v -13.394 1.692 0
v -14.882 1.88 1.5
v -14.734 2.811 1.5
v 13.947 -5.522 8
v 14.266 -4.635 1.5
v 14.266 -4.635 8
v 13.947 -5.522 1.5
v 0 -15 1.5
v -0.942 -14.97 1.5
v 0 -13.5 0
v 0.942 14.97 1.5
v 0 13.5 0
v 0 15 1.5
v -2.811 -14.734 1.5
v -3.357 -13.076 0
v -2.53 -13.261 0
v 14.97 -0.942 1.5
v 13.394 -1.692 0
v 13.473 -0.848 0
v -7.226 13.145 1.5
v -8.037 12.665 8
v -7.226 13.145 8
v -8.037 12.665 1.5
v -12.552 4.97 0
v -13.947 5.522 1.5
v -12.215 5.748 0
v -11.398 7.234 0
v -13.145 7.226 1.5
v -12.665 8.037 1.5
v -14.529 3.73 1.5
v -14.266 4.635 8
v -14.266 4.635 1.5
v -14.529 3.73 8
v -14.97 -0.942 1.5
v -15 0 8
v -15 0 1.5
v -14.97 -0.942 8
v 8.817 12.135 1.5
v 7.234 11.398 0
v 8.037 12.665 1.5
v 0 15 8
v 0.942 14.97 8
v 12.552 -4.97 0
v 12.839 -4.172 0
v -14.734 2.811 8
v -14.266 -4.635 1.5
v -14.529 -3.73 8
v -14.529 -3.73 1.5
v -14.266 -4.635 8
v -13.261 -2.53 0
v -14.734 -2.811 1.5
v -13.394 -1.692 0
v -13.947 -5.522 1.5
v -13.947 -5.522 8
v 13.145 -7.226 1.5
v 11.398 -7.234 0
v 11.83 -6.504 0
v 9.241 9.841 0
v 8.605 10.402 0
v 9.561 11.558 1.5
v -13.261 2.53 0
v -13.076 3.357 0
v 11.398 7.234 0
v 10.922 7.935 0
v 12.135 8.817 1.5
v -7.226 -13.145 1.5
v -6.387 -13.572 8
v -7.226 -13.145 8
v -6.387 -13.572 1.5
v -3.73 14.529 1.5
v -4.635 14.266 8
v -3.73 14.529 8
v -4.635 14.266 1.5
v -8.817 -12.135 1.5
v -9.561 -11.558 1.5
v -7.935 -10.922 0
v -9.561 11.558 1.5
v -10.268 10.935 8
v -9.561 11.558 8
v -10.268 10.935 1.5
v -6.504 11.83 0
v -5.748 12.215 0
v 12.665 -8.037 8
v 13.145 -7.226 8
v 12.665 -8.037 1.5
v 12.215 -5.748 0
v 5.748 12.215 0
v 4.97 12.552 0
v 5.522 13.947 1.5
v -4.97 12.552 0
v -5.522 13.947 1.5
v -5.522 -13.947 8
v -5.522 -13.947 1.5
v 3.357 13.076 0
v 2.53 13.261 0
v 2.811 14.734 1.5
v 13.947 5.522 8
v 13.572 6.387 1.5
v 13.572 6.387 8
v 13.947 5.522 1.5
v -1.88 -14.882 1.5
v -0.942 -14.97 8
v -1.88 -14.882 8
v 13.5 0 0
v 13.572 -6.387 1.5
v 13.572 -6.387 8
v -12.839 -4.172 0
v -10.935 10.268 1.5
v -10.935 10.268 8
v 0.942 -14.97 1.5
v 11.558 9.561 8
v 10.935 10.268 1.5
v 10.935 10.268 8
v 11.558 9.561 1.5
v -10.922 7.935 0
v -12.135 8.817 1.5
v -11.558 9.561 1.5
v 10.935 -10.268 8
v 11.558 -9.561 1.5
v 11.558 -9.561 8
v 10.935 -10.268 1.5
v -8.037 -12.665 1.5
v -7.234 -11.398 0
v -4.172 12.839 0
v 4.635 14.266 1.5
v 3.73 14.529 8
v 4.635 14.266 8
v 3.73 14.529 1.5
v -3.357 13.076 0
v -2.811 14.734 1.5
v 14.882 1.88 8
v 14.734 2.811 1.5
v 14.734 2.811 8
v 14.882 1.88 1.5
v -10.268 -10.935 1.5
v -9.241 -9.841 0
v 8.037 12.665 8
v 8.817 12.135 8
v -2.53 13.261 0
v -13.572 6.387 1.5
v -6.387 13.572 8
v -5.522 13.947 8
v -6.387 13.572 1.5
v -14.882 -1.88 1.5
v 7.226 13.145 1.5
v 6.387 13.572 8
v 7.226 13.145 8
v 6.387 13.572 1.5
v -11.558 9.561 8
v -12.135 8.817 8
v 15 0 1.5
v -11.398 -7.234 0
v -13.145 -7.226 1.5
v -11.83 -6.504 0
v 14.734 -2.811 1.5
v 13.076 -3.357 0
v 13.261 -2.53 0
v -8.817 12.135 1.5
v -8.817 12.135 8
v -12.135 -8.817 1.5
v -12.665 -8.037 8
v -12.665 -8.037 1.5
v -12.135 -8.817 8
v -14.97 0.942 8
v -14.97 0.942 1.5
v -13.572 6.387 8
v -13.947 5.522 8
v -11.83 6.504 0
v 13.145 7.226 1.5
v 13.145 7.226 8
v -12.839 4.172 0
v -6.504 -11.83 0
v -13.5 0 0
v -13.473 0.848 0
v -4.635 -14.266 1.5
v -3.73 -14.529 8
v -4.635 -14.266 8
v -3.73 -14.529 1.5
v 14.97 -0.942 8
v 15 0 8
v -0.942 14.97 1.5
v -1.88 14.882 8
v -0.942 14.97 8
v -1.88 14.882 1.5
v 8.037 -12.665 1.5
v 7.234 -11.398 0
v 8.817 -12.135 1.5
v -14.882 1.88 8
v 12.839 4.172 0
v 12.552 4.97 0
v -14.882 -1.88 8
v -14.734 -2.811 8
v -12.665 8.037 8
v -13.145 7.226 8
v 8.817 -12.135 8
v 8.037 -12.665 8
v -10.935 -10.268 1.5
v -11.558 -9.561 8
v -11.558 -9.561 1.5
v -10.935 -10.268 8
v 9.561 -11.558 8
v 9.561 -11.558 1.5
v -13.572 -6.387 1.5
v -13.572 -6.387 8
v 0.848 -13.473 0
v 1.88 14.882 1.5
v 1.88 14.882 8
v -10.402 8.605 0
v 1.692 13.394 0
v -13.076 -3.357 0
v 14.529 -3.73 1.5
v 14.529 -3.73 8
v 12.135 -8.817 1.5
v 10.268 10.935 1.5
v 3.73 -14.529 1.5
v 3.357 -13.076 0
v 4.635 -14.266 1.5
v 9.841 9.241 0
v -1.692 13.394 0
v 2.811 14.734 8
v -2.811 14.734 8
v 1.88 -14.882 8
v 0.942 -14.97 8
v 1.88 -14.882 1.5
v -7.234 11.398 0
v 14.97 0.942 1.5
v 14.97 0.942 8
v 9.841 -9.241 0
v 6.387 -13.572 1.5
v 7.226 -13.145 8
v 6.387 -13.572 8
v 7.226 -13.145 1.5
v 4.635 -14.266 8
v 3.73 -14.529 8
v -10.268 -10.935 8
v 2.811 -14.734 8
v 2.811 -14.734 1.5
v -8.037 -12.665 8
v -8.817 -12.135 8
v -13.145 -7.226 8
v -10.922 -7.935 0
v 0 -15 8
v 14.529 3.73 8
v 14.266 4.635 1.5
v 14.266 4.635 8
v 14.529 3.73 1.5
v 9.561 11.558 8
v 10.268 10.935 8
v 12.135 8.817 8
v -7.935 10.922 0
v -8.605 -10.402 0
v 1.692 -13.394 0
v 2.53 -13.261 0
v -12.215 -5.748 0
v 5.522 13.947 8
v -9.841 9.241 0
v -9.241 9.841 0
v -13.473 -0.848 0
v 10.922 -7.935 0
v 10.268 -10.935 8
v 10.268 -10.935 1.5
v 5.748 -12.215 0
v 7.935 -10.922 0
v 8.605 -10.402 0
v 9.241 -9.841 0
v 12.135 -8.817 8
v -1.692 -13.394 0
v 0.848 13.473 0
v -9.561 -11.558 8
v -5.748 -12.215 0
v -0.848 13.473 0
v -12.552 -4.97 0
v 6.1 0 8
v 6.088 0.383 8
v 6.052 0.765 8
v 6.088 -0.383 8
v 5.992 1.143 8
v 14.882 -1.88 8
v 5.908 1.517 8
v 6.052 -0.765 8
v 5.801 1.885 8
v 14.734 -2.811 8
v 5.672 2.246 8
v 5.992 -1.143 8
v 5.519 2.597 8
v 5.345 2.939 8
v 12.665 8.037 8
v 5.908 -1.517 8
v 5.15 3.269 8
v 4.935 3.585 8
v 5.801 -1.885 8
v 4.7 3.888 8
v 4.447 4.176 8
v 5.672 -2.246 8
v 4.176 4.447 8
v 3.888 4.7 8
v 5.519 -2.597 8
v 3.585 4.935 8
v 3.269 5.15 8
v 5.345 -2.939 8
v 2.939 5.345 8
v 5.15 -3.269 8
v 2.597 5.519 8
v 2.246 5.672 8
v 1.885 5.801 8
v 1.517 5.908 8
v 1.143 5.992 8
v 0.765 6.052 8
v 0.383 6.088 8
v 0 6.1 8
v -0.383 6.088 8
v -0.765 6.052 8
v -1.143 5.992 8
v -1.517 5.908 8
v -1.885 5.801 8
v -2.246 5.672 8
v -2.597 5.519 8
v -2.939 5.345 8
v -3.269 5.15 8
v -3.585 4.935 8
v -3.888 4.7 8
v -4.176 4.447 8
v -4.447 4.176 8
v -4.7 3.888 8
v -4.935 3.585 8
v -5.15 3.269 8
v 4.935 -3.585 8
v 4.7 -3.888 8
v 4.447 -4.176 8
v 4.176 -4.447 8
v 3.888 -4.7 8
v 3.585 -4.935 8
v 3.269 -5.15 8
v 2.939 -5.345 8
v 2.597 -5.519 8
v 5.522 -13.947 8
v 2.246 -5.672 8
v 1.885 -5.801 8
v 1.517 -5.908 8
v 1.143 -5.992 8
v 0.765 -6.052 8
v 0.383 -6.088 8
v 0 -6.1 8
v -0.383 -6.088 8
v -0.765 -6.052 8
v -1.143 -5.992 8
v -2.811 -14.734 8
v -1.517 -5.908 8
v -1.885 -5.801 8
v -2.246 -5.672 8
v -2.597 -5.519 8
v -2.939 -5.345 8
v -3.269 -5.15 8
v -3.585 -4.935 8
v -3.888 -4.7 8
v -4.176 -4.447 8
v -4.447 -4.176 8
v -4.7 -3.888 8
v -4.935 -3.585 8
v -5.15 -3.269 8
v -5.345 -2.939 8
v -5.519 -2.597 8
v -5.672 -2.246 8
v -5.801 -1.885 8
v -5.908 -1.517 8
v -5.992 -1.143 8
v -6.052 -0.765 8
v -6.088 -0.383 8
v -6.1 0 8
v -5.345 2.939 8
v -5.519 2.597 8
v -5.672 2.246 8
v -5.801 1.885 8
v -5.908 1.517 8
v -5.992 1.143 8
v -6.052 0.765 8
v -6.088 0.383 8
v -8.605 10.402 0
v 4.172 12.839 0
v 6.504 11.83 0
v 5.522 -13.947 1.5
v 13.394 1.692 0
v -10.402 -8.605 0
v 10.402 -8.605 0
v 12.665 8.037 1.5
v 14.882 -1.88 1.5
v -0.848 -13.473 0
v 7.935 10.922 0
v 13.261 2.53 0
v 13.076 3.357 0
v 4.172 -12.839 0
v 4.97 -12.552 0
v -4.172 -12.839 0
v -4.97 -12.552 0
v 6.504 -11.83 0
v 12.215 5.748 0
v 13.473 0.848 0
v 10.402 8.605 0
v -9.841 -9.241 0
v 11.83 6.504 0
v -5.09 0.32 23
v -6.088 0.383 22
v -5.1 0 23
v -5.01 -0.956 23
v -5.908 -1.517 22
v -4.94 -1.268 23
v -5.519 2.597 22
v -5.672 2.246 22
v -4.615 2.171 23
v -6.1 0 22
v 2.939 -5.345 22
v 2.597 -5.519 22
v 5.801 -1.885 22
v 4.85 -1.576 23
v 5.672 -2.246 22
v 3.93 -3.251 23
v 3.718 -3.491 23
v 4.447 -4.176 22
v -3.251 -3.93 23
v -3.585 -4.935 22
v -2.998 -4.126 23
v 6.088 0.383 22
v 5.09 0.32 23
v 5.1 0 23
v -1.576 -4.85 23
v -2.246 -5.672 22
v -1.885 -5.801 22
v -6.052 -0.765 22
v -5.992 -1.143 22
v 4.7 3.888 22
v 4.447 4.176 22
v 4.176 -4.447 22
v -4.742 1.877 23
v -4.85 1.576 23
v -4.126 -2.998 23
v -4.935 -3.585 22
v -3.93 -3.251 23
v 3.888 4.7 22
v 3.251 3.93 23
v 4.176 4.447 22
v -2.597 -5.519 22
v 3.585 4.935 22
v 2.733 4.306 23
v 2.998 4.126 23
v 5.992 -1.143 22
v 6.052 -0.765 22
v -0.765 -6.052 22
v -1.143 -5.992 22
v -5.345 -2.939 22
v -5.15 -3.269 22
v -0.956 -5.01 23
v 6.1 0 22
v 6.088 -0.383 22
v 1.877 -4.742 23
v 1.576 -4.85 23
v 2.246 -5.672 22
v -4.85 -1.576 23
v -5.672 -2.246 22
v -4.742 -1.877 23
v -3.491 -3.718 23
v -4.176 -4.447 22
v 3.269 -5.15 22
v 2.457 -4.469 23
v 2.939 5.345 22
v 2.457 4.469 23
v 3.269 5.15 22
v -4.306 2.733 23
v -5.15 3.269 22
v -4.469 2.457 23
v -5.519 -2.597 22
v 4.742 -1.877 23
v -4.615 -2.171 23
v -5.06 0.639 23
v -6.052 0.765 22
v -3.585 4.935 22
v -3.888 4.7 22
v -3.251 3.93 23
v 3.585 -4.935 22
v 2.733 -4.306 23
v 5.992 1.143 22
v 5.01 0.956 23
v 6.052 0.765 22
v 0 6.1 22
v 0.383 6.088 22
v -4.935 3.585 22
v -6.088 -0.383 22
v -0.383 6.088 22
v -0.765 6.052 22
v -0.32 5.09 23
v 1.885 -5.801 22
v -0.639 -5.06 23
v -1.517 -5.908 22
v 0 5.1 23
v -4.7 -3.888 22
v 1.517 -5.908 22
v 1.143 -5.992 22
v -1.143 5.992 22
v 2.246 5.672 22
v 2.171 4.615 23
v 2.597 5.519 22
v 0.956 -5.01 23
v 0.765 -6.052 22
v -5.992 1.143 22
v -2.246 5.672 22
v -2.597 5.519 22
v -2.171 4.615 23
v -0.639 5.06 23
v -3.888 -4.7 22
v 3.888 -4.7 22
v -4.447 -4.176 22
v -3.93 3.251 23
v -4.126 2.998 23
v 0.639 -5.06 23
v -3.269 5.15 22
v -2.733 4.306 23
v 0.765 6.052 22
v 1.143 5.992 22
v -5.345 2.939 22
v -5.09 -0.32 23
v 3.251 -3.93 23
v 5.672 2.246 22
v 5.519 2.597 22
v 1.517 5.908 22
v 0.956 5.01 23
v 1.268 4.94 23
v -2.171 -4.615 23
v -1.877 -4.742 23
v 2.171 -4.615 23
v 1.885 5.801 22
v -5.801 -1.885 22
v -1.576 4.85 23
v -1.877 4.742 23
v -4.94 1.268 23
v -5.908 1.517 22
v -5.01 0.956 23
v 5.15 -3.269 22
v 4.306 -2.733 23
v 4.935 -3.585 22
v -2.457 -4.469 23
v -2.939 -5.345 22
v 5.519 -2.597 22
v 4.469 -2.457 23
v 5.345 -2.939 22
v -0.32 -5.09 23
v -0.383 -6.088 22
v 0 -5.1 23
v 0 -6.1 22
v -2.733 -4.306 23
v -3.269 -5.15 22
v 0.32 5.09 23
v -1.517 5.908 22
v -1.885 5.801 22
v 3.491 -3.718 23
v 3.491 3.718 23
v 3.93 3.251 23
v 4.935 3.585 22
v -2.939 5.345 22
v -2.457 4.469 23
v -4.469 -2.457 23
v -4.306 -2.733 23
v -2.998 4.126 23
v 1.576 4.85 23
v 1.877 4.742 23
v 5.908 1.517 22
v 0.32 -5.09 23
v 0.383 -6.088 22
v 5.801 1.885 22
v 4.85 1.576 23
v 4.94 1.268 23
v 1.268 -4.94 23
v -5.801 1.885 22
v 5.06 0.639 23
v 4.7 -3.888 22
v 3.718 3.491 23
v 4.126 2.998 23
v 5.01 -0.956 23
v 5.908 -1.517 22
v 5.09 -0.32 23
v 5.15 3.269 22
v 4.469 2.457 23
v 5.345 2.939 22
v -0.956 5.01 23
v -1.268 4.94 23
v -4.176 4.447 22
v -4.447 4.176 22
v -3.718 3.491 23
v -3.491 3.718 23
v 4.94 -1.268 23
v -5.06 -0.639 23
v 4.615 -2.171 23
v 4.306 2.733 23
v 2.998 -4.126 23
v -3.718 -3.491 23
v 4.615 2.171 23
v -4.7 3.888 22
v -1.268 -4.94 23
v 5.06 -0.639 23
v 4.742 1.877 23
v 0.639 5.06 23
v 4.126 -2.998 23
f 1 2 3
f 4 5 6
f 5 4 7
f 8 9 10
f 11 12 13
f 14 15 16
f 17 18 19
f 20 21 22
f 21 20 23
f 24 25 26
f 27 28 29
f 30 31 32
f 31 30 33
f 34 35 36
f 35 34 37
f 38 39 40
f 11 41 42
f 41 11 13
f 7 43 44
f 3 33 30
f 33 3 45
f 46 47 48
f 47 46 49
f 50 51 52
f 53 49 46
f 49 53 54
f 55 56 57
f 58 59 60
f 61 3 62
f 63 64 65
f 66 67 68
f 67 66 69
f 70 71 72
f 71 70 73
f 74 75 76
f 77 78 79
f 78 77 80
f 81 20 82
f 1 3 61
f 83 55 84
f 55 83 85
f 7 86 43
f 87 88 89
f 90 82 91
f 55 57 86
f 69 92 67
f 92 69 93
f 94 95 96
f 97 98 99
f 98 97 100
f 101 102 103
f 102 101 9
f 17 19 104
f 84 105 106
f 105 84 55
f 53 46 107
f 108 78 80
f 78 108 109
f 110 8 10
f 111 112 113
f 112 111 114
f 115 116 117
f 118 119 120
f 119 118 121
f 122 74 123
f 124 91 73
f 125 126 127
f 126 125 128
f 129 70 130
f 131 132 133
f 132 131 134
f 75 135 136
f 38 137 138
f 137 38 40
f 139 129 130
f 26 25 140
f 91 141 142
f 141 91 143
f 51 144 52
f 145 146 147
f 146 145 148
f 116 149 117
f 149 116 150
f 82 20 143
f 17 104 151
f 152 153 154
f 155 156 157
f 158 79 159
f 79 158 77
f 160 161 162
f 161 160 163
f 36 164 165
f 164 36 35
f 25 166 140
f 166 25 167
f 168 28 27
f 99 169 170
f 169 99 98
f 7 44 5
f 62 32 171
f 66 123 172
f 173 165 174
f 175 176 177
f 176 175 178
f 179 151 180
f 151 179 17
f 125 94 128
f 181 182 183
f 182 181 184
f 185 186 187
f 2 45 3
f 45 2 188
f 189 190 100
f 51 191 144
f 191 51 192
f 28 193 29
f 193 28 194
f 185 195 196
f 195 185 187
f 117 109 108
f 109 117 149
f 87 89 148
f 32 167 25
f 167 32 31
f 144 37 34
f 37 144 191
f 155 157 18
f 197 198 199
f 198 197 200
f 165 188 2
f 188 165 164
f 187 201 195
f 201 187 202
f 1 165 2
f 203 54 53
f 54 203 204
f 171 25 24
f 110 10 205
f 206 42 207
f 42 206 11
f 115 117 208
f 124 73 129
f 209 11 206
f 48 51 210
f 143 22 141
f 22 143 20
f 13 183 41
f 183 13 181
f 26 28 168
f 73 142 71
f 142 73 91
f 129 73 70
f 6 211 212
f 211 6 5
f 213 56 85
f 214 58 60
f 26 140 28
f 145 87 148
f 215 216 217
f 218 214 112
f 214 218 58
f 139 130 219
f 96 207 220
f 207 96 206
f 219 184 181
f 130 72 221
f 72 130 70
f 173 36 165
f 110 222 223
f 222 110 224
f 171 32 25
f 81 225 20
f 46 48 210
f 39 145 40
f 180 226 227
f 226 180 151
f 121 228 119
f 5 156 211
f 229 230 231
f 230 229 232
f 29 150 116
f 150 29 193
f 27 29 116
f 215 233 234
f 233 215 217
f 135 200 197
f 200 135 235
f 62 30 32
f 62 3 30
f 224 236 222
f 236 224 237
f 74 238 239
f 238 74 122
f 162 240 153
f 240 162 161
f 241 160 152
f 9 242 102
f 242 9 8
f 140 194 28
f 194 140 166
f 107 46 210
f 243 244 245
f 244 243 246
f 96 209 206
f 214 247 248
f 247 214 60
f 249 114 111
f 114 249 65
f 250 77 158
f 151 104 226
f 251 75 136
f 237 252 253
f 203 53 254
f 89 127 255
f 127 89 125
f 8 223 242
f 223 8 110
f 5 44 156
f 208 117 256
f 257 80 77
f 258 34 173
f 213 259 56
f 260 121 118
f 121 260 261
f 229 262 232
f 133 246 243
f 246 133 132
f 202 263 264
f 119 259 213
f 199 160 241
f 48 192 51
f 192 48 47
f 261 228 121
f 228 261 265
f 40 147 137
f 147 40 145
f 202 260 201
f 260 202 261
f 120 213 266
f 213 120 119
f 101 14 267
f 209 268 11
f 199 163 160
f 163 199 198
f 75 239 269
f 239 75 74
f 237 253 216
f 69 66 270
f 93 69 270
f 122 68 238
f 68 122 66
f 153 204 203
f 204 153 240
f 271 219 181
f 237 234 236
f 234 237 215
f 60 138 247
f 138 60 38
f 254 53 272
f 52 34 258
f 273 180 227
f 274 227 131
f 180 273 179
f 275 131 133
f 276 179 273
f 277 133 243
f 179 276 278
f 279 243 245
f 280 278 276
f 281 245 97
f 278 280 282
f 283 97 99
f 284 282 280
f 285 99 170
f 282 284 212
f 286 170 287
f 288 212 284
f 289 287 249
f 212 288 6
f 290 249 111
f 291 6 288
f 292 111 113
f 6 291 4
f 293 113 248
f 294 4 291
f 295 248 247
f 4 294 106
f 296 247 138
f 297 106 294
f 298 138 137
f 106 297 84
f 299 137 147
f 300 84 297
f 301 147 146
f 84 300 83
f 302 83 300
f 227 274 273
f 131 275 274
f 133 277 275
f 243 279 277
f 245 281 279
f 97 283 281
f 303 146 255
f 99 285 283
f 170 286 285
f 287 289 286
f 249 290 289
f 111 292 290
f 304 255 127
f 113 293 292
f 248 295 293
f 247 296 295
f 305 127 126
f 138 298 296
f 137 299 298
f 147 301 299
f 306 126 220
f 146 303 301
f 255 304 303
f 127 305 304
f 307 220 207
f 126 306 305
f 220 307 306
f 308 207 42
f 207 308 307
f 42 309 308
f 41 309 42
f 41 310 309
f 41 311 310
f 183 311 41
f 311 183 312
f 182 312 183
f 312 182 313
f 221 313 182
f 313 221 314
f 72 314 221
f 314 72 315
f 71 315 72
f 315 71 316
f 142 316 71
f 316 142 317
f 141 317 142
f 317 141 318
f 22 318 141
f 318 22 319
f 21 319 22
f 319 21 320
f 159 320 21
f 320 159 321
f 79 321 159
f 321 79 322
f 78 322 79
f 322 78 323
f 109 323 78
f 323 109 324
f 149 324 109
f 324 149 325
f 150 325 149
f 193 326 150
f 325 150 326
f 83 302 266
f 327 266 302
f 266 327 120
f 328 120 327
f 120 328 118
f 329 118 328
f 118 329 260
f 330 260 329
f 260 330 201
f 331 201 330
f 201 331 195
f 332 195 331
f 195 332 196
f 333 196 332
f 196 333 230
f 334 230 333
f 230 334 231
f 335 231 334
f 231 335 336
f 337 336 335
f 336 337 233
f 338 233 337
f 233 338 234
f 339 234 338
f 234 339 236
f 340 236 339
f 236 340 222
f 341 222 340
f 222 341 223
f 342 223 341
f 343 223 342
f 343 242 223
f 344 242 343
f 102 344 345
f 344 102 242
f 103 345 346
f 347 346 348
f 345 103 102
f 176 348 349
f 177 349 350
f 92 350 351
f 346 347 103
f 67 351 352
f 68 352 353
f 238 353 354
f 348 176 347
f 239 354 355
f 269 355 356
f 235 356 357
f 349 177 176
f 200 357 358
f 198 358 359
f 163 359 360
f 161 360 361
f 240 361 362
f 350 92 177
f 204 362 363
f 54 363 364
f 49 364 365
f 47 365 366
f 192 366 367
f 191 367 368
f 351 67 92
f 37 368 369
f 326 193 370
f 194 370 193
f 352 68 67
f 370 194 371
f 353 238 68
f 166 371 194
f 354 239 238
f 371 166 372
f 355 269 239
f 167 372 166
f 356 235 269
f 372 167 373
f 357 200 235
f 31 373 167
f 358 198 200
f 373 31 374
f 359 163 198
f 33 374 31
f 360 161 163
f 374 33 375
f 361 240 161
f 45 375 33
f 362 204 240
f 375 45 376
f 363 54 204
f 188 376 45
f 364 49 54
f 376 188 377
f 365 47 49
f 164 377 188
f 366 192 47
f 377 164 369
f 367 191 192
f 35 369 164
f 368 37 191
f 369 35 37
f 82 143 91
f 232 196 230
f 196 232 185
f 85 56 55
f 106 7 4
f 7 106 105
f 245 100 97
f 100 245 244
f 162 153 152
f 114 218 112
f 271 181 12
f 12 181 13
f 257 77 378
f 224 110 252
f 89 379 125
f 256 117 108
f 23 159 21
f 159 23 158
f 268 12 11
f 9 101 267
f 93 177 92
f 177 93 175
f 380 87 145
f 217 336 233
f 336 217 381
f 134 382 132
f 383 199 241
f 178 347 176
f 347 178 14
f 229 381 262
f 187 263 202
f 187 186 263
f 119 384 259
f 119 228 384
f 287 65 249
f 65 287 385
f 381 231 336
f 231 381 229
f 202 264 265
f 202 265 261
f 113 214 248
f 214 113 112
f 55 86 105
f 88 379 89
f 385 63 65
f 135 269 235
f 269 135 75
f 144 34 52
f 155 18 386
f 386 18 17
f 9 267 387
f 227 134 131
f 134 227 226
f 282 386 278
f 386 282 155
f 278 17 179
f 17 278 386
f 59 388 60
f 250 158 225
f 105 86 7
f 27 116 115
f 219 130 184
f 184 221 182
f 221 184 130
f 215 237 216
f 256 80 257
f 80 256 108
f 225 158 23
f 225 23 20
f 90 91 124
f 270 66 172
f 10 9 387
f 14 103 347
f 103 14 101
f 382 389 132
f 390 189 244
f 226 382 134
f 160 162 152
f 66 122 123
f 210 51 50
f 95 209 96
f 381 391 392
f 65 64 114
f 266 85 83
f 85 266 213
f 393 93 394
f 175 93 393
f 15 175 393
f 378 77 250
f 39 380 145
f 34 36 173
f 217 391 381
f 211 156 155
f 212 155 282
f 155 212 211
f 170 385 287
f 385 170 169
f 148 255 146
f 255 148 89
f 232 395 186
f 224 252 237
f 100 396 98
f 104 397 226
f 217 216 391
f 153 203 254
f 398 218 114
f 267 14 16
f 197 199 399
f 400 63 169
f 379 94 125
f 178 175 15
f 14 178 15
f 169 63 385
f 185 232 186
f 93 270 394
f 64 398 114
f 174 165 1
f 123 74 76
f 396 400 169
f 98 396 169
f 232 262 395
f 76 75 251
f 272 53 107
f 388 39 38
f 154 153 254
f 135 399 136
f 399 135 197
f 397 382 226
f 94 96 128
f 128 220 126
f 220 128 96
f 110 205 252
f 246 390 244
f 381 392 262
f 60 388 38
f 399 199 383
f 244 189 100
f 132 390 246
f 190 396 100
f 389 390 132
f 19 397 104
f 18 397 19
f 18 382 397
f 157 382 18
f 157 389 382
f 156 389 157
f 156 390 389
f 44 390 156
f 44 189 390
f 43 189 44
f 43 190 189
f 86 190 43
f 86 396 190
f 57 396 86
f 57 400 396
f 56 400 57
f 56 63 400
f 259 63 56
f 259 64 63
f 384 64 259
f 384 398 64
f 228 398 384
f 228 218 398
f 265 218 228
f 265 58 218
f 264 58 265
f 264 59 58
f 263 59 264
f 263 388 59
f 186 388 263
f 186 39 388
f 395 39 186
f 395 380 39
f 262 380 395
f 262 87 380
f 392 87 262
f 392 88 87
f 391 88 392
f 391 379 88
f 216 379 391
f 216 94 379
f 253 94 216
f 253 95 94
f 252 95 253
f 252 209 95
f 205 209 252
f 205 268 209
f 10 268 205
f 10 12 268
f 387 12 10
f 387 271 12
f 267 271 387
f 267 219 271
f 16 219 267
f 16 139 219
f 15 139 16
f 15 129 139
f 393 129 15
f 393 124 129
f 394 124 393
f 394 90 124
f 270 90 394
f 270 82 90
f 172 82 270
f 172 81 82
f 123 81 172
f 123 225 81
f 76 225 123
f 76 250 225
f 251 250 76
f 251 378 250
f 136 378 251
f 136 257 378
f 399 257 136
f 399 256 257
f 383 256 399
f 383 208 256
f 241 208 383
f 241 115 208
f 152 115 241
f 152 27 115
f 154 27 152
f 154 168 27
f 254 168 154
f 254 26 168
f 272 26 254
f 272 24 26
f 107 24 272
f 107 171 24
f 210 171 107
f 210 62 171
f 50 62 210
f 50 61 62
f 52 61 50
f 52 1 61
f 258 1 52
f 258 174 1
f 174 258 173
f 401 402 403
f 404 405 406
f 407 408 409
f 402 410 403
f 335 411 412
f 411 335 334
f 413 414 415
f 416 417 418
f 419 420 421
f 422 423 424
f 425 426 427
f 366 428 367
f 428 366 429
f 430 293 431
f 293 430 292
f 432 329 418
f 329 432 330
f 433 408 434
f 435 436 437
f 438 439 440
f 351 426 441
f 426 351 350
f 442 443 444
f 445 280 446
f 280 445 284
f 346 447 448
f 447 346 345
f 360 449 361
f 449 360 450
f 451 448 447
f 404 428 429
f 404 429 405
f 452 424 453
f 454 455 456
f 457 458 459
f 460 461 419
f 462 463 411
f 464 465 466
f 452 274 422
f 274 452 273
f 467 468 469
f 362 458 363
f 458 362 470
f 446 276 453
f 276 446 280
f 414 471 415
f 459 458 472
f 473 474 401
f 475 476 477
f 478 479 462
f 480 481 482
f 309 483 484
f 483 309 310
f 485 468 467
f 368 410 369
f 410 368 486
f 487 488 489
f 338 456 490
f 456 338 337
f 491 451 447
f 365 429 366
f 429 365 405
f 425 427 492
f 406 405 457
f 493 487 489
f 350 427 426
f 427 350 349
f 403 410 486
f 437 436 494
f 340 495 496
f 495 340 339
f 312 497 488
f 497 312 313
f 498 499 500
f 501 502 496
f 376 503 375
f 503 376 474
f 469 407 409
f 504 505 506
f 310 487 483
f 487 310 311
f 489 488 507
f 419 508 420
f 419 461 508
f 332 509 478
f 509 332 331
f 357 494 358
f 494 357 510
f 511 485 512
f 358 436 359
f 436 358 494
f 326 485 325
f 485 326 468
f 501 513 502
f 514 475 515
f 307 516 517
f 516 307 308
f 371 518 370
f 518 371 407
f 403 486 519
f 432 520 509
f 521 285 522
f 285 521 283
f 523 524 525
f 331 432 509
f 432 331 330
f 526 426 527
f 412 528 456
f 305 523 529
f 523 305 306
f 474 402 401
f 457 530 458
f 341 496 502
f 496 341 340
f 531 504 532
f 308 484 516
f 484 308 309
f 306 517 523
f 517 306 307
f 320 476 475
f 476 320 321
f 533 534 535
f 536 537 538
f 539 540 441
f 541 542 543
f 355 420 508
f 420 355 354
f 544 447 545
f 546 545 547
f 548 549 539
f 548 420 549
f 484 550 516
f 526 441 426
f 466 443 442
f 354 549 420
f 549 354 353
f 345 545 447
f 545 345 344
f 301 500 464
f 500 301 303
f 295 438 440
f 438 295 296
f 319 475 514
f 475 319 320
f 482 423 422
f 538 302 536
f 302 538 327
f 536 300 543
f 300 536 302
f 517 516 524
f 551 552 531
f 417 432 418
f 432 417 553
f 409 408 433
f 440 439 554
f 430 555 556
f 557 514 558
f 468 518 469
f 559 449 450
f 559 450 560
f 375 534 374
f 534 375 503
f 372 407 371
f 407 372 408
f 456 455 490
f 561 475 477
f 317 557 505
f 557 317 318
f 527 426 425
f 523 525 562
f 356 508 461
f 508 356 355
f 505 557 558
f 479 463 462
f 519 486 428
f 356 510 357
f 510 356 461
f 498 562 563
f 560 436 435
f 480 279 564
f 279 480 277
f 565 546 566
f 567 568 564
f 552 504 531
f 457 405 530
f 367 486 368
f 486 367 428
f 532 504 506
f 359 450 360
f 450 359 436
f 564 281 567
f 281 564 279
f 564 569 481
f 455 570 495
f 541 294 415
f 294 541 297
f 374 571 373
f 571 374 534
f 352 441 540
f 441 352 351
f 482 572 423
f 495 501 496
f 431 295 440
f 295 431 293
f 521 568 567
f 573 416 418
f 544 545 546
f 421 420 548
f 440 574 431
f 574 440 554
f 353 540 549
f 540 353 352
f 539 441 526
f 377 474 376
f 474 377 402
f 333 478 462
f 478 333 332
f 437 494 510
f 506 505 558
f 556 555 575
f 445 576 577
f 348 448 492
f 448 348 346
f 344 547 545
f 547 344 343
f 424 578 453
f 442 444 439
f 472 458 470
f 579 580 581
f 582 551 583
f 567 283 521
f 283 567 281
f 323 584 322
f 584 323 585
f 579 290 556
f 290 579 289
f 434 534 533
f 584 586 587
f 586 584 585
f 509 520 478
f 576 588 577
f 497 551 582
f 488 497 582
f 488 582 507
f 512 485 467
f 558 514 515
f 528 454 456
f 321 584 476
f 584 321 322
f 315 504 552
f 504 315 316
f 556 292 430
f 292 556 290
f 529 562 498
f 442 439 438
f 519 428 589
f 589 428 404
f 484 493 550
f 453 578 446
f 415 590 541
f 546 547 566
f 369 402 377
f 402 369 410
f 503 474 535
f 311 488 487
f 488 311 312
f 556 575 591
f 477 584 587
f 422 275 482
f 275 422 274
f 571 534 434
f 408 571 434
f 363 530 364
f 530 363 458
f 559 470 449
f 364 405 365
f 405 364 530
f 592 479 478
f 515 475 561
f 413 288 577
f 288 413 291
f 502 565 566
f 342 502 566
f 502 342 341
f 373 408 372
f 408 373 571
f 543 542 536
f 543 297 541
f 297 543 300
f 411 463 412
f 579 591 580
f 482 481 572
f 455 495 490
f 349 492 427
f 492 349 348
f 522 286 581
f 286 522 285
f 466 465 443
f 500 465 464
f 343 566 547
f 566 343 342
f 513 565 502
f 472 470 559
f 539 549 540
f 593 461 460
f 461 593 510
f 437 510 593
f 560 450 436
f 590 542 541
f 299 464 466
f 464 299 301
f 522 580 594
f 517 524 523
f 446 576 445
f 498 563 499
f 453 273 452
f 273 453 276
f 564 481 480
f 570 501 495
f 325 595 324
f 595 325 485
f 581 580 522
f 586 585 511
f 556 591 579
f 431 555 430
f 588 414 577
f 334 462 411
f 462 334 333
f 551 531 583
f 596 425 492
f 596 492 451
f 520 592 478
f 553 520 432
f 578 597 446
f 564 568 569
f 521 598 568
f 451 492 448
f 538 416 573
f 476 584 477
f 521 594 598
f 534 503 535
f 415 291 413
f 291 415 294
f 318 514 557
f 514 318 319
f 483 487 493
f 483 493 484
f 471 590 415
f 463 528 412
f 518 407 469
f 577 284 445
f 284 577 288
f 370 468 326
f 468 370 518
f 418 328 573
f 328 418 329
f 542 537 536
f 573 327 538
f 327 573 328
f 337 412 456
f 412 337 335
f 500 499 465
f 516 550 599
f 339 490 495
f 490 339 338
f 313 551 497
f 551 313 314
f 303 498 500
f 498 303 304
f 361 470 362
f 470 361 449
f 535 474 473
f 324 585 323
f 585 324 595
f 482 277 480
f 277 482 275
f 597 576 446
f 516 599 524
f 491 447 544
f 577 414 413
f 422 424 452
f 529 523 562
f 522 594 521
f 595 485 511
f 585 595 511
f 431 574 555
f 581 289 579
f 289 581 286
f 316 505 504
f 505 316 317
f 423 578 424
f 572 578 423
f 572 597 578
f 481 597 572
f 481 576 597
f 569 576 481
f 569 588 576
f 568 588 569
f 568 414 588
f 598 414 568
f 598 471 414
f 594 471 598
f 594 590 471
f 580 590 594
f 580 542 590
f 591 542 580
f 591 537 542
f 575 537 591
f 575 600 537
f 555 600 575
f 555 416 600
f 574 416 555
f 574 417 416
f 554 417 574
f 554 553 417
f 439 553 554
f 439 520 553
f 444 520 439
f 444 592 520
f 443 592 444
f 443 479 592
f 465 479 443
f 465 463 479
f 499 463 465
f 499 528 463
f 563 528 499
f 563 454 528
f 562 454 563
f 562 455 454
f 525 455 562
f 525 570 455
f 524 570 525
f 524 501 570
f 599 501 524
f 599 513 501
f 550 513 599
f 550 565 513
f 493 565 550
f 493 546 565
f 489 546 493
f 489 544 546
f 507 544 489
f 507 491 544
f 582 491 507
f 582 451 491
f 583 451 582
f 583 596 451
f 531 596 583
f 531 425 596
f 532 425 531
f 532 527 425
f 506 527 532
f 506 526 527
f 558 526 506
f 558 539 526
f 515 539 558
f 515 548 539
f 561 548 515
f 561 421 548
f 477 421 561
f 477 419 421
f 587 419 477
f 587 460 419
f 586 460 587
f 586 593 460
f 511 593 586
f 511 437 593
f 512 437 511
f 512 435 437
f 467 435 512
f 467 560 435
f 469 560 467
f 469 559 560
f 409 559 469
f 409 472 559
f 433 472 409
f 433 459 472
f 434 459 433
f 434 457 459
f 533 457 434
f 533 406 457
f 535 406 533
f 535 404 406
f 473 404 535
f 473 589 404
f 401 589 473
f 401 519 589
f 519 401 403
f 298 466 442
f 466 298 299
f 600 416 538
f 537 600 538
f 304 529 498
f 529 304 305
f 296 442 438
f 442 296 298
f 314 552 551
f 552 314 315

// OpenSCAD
// SPDX-License-Identifier: CC-BY-4.0
// SPDX-FileCopyrightText: 2026 Todd Sayre
// ============================================================
// Foot with post — a TPU foot that plugs into a socket in the
// bottom of whatever it is holding up
//
// Two stacked cylinders on one axis. The lower, wider one is
// the foot: it stands on the floor, lifts the object by its
// own height, and being TPU it grips and it damps. The upper,
// narrower one is the post: it is a plug for the hole already
// in the bottom of the object, and it is the only thing
// holding the foot on.
//
// The step between the two is the shoulder, and it is what the
// object actually rests on. The post carries no load down the
// axis — it is there so the foot cannot walk out from under
// the object or fall off when the thing is picked up.
//
// The foot's bottom rim is chamfered. TPU squashes its first
// layer more than a rigid filament does, and a foot is the one
// part where a flared elephant foot is guaranteed to be the
// surface bearing on the floor. The chamfer gives that squash
// somewhere to go.
//
// The post's top rim is chamfered too, for a different reason:
// it is a lead-in. A soft post pushed at a hole it is not
// quite lined up with folds over instead of entering, so the
// tip is made smaller than the hole and grows into it.
//
// The socket is a hole that opens at the bottom face of the
// object, so the caliper's inside jaws and depth rod both
// reach it. The post is never measured — it is the socket plus
// an interference knob, because TPU is fitted by squeezing it
// rather than by clearing it.
//
// Modeled in its print orientation: foot on the plate, post
// pointing up.
//
// PRINT NOTES:
// - TPU, no supports needed. Print as modeled, foot down.
// - Nothing in the part hangs. The post's top chamfer closes
//   inward, the shoulder faces up, and the only downward face
//   is the foot's bottom chamfer at 45 deg, in the first
//   millimetre or two off the plate.
// - Both chamfers are written with their radial run equal to
//   their rise, so no value either knob is given can turn one
//   into an overhang.
// - Slow it down. TPU at speed under-extrudes on the small
//   circumference of the post, and the post is the part that
//   has to hold.
// - Infill is the squish. A foot printed at 15% gives under
//   weight and one printed solid barely does, and neither is
//   wrong — it is what the foot is for. 3 perimeters either
//   way, so the post has walls rather than infill in it.
// - Print the set together and they come out the same height.
//   Printed one at a time they will not, quite.
// ============================================================

// MARK: Dimensions

// Measure the socket in the object
socket_d = 12; // mm, smallest reading
socket_depth = 20; // mm

// Size the foot
foot_d = 30; // mm
foot_h = 8; // mm
post_h = 15; // mm, how far it reaches into the socket

// MARK: Tuning

post_interference = 0.2; // mm, added to socket_d for a squeeze fit
foot_chamfer = 1.5; // mm, on the bottom rim
post_chamfer = 1; // mm, lead-in on the post's top rim

// Buries the post's base in the foot so the union has no shared face
post_overlap = 0.01; // mm

$fn = 100;

// MARK: Derived

post_d = socket_d + post_interference;
total_height = foot_h + post_h;

// Width of the ring the object rests on. This is the whole load path from the
// object into the foot, and it is what a foot barely wider than its own post
// runs out of
shoulder = (foot_d - post_d) / 2;

// Flat left on the floor once the chamfer has taken the rim. The foot stands on
// this and the first layer is this wide, so a generous chamfer on a narrow foot
// costs bed adhesion on the one part that is nothing but bed adhesion
foot_contact_d = foot_d - 2 * foot_chamfer;

// Air left at the bottom of the socket with the shoulder seated. It has to be
// positive or the post reaches the end of the hole first and holds the object
// off its own foot
seat_gap = socket_depth - post_h;

// MARK: Checks

echo(str("overall height = ", total_height, " mm"));
echo(str("post diameter = ", post_d, " mm into a ", socket_d, " mm socket"));
echo(str("shoulder ring = ", shoulder, " mm"));
echo(str("contact patch on the floor = ", foot_contact_d, " mm across"));
echo(str("air under the post when seated = ", seat_gap, " mm"));

assert(foot_h > 0, "foot_h has to be positive — there is no foot without one");
assert(post_h > 0, "post_h has to be positive — there is nothing holding the foot on without one");
assert(post_d > 0, "post_interference has closed the post — it cannot be more negative than the socket is wide");
assert(shoulder > 0, "the foot is no wider than the post — widen foot_d, or this is just a plug");
assert(foot_contact_d > 0, "the bottom chamfer has eaten the whole contact patch — reduce foot_chamfer or widen foot_d");
assert(foot_chamfer < foot_h, "the bottom chamfer is taller than the foot — reduce foot_chamfer or raise foot_h");
assert(2 * post_chamfer < post_d, "the top chamfer has closed the post to a point — reduce post_chamfer");
assert(post_overlap > 0 && post_overlap < foot_h, "post_overlap has to be a sliver, and it has to fit inside the foot");
assert(post_chamfer < post_h, "the lead-in is longer than the post — reduce post_chamfer or raise post_h");
assert(seat_gap > 0, "the post is longer than the socket is deep — it bottoms out before the shoulder seats, so reduce post_h");

// MARK: Geometry

// The foot: a cylinder standing on the plate with its bottom rim broken. x is
// radius out from the axis, y is height up from the floor. The chamfer moves
// out and up by the same amount, so it sits at 45 deg whatever foot_chamfer
// says
module foot_body() {
  r = foot_d / 2;
  rotate_extrude()
    polygon([
      [0, 0],
      [r - foot_chamfer, 0],
      [r, foot_chamfer],
      [r, foot_h],
      [0, foot_h],
    ]);
}

// The post: a narrower cylinder stacked on the foot, its top rim broken the
// same way to lead it into the socket. Its base sits inside the foot rather
// than on top of it, so the two solids meet in material instead of on a
// coincident face
module post_body() {
  r = post_d / 2;
  translate([0, 0, foot_h - post_overlap])
    rotate_extrude()
      polygon([
        [0, 0],
        [r, 0],
        [r, post_h + post_overlap - post_chamfer],
        [r - post_chamfer, post_h + post_overlap],
        [0, post_h + post_overlap],
      ]);
}

module foot_with_post() {
  union() {
    foot_body();
    post_body();
  }
}

foot_with_post();
